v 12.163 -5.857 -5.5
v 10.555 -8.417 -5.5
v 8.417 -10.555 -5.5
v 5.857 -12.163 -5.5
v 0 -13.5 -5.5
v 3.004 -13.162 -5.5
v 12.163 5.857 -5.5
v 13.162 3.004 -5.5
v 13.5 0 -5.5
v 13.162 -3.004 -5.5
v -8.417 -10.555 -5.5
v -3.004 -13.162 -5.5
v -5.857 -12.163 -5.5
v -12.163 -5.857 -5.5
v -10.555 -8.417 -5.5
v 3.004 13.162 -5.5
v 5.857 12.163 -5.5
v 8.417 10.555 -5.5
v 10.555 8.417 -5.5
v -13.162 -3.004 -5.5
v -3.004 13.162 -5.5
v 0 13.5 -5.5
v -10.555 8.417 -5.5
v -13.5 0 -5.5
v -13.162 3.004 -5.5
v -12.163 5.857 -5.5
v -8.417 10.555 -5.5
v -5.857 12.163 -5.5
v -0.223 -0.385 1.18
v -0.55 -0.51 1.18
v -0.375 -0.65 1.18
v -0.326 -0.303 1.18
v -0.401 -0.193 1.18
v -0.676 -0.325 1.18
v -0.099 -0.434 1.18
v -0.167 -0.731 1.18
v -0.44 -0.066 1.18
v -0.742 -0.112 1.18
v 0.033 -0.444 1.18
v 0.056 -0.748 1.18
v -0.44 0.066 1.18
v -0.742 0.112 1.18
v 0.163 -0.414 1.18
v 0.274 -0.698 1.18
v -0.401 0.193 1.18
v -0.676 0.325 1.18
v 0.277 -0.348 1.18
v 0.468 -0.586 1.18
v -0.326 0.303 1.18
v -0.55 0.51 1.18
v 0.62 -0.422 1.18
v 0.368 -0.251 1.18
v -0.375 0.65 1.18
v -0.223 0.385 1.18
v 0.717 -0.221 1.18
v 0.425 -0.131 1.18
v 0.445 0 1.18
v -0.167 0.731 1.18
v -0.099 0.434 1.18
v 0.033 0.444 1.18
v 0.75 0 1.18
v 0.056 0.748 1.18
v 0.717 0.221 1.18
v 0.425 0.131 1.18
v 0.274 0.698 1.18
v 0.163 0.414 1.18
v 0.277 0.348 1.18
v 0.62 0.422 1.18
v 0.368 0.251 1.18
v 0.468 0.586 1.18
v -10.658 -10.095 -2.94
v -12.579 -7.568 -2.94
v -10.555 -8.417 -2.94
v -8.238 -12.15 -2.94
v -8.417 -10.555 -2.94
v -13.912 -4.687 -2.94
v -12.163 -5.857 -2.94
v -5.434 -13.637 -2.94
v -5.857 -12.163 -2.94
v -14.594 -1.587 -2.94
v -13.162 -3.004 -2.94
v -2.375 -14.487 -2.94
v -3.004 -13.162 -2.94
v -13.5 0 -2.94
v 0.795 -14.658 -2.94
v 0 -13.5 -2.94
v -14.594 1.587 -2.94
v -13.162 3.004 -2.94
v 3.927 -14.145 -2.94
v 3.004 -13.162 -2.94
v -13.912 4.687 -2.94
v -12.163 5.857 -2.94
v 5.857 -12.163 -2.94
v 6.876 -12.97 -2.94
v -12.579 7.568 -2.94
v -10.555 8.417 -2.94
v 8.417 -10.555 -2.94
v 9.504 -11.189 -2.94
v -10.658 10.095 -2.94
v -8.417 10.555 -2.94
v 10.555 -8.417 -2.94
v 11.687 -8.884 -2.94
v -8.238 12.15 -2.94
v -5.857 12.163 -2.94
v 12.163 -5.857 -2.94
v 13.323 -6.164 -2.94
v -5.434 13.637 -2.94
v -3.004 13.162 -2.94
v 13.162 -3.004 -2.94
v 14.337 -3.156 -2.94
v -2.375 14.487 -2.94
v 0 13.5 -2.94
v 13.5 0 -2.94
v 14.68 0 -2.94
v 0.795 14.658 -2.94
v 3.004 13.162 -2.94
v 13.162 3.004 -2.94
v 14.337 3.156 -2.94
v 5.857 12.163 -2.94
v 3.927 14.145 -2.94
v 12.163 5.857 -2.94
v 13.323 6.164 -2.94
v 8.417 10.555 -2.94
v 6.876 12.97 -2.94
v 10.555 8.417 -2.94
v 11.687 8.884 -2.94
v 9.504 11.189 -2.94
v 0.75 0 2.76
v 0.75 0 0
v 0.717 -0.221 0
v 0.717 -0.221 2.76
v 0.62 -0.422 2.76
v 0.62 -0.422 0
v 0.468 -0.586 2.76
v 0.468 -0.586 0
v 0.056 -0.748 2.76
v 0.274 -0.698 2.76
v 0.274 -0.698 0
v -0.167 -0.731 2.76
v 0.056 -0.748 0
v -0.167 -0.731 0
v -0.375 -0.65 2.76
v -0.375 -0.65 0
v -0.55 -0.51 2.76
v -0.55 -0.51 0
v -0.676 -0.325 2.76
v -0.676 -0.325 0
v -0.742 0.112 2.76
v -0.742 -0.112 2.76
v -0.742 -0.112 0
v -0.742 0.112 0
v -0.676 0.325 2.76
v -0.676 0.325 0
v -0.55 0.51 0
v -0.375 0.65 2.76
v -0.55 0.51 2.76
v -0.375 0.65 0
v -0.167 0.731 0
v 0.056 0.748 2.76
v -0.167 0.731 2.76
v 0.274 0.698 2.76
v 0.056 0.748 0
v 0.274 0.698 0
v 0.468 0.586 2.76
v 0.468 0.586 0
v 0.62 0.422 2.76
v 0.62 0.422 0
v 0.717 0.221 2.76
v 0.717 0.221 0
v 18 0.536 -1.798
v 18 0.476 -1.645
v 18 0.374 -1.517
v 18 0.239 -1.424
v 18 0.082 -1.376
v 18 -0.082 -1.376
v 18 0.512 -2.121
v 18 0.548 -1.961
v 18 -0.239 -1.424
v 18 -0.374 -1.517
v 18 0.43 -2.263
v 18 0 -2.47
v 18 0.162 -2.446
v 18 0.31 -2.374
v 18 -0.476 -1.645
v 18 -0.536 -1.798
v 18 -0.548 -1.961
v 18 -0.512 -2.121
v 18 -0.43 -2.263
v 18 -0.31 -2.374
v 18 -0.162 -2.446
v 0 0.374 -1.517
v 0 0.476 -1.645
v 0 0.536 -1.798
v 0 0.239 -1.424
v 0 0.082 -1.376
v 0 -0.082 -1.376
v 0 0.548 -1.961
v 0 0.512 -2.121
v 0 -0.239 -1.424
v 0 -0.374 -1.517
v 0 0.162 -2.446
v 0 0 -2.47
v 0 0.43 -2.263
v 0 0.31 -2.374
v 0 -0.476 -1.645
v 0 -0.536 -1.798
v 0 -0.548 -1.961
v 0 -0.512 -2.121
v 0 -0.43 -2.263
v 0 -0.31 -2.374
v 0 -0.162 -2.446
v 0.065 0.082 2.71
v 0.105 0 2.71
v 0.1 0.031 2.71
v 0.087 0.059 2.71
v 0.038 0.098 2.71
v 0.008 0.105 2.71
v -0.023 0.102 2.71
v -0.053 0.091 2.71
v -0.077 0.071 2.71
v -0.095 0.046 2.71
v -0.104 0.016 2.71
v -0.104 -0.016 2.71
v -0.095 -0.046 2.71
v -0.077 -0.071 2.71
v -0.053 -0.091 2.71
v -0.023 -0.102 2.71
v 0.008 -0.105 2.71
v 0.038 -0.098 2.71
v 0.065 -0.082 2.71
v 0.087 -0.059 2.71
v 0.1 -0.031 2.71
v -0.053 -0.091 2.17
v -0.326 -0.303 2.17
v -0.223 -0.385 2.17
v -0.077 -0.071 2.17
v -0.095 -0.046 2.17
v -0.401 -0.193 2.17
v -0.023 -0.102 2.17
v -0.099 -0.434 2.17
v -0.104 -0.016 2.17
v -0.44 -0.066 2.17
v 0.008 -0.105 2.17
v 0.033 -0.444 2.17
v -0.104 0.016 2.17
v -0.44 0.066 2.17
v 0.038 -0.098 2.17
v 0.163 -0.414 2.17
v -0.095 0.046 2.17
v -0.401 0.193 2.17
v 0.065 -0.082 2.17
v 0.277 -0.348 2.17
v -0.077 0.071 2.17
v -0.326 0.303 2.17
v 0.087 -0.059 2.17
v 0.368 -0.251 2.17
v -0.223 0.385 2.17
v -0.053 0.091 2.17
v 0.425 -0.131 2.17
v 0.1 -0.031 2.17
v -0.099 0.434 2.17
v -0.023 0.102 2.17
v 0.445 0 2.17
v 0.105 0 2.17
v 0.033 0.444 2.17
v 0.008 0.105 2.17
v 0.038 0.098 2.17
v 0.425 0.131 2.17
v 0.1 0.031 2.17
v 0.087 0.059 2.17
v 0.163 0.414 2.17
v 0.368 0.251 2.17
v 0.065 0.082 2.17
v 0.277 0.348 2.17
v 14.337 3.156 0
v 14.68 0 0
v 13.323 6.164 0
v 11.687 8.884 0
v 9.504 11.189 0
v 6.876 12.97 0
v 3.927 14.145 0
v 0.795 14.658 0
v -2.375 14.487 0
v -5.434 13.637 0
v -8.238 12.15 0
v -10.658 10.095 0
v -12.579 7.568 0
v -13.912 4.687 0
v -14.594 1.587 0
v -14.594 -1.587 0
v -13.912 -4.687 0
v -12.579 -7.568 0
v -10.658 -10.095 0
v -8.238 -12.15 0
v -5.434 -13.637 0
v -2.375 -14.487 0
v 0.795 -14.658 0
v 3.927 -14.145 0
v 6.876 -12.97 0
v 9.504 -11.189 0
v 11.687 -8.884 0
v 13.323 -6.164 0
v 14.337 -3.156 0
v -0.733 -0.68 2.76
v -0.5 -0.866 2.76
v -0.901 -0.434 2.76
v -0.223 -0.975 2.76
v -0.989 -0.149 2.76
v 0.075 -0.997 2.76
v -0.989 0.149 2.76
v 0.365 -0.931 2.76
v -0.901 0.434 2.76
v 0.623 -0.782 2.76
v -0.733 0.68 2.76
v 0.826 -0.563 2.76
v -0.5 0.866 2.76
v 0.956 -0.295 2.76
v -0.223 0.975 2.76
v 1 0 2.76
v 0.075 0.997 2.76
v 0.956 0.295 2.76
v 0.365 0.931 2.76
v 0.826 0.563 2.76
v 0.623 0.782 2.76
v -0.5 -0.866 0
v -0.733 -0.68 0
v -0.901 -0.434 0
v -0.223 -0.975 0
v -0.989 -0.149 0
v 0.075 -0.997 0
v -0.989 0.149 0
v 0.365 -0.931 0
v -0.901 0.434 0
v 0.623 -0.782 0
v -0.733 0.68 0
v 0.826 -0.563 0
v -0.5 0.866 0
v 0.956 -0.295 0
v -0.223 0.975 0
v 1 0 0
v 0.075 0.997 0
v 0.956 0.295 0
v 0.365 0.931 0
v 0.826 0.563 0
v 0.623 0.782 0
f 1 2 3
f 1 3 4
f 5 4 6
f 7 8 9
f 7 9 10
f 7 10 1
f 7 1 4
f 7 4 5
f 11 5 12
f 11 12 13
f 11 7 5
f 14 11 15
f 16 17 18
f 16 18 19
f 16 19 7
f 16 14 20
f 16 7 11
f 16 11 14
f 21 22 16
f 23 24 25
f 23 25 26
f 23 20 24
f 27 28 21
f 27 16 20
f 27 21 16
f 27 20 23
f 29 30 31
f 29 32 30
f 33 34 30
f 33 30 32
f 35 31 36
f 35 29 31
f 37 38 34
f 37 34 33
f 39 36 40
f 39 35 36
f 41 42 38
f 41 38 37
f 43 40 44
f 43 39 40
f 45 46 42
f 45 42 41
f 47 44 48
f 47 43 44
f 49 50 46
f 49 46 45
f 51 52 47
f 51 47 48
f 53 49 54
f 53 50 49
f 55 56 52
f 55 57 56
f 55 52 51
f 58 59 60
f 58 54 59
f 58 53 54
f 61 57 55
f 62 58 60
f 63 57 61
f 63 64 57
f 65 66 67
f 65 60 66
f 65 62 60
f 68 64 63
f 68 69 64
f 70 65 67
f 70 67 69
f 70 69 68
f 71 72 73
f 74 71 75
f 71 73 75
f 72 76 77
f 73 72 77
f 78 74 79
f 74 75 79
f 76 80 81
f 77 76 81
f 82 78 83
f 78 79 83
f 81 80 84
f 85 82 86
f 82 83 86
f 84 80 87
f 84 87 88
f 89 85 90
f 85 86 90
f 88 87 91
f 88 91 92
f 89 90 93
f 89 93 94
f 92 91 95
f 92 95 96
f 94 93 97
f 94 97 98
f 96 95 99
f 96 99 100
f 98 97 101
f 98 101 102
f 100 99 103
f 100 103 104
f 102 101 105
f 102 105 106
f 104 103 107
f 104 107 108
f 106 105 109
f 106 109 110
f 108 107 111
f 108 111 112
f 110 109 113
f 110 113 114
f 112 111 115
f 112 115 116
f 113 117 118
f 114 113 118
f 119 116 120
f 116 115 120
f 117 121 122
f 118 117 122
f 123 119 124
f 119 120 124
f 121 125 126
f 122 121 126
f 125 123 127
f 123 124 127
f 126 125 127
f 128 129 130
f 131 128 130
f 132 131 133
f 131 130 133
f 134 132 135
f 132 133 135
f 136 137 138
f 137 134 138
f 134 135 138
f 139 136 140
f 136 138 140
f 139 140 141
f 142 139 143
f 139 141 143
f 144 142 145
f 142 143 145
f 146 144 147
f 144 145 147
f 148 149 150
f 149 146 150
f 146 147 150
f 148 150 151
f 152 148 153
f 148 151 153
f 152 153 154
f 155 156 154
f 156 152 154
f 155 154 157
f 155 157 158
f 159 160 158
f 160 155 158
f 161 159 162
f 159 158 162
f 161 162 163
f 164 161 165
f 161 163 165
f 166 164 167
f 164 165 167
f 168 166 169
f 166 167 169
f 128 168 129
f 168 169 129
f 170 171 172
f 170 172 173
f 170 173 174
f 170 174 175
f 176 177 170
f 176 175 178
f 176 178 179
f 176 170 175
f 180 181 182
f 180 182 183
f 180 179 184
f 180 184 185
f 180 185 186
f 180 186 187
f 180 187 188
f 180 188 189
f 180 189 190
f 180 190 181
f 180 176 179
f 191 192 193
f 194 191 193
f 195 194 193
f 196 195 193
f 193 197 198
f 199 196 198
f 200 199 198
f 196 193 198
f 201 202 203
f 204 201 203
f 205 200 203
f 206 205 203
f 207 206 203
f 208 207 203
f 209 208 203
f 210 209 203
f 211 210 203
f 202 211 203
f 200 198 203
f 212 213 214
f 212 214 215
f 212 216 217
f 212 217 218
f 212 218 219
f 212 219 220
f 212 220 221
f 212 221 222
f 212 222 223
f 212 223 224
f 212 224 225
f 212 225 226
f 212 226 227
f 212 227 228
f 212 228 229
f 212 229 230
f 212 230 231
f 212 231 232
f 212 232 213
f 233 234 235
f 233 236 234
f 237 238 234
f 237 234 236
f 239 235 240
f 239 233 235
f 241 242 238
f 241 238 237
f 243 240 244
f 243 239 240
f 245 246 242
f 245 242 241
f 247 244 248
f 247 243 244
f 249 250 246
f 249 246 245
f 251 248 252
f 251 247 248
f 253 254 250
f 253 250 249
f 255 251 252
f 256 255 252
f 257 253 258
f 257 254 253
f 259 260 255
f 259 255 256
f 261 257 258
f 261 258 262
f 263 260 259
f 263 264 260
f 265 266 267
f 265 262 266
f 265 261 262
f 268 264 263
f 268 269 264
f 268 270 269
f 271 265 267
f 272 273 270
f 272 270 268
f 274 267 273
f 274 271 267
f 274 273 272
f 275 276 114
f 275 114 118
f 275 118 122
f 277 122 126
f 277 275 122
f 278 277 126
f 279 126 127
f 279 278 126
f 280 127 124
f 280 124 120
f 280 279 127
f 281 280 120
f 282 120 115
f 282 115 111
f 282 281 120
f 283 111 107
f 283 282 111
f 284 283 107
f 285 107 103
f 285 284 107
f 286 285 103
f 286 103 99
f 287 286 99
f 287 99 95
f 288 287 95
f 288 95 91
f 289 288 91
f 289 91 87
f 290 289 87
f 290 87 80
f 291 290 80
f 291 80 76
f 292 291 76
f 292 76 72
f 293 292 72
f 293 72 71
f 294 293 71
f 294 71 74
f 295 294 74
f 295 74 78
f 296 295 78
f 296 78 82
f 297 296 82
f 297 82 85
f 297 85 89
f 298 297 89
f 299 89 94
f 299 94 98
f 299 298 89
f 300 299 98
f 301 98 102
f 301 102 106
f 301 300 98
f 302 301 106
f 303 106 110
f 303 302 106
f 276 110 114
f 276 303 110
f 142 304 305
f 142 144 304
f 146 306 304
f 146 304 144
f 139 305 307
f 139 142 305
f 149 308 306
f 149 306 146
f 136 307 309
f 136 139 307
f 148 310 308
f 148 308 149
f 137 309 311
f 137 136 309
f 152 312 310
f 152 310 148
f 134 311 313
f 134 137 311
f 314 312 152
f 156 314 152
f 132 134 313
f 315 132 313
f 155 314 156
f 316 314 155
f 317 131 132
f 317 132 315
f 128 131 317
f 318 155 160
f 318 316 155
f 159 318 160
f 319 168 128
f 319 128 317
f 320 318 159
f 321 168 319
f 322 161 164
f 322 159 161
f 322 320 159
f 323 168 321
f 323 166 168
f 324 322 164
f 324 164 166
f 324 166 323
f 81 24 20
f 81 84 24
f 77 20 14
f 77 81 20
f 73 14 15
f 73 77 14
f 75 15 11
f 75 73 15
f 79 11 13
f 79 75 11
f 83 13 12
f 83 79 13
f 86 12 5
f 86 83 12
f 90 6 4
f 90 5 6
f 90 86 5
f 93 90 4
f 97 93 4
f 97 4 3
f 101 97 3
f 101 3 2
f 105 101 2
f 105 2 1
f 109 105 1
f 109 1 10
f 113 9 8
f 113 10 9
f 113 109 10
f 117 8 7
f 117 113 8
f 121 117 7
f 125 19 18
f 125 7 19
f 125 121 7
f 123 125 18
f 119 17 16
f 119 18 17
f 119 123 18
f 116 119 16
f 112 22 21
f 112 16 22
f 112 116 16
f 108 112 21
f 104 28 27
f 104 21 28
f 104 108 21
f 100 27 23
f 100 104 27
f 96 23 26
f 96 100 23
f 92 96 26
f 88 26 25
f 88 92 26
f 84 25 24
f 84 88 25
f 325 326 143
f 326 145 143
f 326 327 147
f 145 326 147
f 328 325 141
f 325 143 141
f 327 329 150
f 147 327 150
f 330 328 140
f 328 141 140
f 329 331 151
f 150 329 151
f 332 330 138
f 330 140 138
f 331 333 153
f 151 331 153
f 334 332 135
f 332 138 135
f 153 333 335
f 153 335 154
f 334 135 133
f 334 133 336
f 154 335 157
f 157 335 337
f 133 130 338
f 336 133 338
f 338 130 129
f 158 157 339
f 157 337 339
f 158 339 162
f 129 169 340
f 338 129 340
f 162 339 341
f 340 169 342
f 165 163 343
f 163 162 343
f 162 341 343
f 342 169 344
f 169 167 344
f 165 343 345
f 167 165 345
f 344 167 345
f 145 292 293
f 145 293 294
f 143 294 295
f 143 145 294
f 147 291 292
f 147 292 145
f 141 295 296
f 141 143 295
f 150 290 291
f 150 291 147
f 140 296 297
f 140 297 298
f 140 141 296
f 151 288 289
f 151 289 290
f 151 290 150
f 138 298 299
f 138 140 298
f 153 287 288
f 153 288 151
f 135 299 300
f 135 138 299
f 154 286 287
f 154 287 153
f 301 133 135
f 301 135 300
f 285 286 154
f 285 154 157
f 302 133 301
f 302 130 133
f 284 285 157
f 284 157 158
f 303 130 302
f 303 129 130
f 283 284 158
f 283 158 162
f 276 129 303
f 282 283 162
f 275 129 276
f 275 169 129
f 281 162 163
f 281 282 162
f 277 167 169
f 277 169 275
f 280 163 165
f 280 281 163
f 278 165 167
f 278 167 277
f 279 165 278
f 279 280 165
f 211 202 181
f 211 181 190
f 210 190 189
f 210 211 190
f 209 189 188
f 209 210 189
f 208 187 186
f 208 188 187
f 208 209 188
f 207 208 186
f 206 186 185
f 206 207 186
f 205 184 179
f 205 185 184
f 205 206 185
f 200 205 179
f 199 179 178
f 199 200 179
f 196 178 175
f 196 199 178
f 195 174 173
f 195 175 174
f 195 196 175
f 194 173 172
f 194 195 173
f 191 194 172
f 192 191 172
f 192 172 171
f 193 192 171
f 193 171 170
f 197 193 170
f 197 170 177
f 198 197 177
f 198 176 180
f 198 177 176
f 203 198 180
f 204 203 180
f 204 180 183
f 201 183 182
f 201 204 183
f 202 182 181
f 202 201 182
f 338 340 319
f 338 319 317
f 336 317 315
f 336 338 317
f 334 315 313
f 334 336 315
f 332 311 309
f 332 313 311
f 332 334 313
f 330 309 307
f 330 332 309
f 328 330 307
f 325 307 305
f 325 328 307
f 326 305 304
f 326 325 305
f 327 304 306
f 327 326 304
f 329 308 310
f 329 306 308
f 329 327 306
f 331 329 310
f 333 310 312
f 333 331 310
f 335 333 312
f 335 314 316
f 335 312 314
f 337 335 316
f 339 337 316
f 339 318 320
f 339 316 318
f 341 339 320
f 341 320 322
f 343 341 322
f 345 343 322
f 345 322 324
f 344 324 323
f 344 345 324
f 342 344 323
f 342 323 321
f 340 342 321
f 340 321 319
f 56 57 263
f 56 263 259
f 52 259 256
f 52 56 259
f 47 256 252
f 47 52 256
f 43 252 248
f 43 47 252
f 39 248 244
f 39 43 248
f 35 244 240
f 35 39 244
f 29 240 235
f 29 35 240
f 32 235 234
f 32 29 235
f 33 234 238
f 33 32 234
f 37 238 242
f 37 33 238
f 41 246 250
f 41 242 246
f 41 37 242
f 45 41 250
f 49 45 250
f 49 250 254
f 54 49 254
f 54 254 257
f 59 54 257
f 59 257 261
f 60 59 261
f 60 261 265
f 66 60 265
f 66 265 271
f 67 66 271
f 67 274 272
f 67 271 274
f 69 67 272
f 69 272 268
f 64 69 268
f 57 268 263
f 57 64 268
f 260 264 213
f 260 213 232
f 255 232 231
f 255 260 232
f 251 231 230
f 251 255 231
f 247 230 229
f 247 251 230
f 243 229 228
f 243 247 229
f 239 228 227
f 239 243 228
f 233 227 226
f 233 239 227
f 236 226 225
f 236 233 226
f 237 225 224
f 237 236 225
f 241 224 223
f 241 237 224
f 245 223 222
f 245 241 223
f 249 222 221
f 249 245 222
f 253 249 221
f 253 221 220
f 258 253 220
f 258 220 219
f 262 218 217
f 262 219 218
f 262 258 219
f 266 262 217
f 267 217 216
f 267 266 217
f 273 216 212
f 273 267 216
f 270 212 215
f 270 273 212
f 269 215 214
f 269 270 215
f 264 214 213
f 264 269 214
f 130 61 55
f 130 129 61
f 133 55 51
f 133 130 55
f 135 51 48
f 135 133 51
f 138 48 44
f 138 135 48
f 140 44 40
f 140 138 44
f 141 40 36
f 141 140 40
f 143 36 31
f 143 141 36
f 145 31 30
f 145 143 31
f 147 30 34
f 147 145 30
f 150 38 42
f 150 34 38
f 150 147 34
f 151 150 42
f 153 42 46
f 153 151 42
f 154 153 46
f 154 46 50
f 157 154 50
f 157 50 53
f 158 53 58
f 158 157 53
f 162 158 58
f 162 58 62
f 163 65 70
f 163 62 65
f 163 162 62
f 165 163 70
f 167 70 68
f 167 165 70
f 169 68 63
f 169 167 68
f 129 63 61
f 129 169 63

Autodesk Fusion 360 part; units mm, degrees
sketch "Sketch1" plane through (0, 0, 0) normal (0, 0, 1) x (1, 0, 0)
  circle A0 centre (0, 0) radius 14.68
  dimension "d1" = 29.36
extrude "Extrude1" add sketch "Sketch1" against normal blind 2.94 makes body 1
sketch "Sketch2" plane through (0, 0, -2.94) normal (0, 0, -1) x (-1, 0, 0)
  circle A0 centre (0, 0) radius 14.68
  circle A1 centre (0, 0) radius 13.5
  dimension "d4" = 27
extrude "Extrude2" add sketch "Sketch2" along normal blind 2.56 contours A1 bodies 1
sketch "Sketch3" plane through (0, 0, 0) normal (0, 0, 1) x (1, 0, 0)
  circle A0 centre (0, 0) radius 14.68
  circle A1 centre (0, 0) radius 0.75
  dimension "d7" = 1.5
extrude "Extrude3" add sketch "Sketch3" along normal blind 1.18 contours A1 bodies 1
sketch "Sketch4" plane through (0, 0, 1.18) normal (0, 0, 1) x (1, 0, 0)
  circle A0 centre (0, 0) radius 0.75
  circle A1 centre (0, 0) radius 0.445
  dimension "d10" = 0.89
extrude "Extrude4" add sketch "Sketch4" along normal blind 0.99 contours A1 bodies 1
sketch "Sketch5" plane through (0, 0, 2.17) normal (0, 0, 1) x (1, 0, 0)
  circle A0 centre (0, 0) radius 0.445
  circle A1 centre (0, 0) radius 0.105
  dimension "d13" = 0.21
extrude "Extrude5" add sketch "Sketch5" along normal blind 0.54 contours A1 bodies 1
sketch "Sketch6" plane through (0, 0, 0) normal (0, 0, 1) x (1, 0, 0)
  circle A0 centre (0, 0) radius 0.75
  circle A1 centre (0, 0) radius 14.68
  circle A2 centre (0, 0) radius 1
  dimension "d16" = 2
extrude "Extrude6" add sketch "Sketch6" along normal blind 2.76 separate body contours A2 makes body 2
sketch "Sketch7" plane through (0, 0, 0) normal (1, 0, 0) x (0, 0, -1)
  line L0 (0, 0) -> (1.92, 0) construction
  circle A0 centre (1.92, 0) radius 0.55
  dimension "d19" = 1.92
  dimension "d20" = 1.1
extrude "Extrude7" add sketch "Sketch7" along normal blind 18 separate body makes body 3
equation "d5 = 5.5 mm - 2.94 mm"
equation "d8 = 0.4 mm + 0.78 mm"
equation "d11 = 0.4 mm + 1.37 mm - 0.78 mm"
equation "d14 = 1.91 mm - 1.37 mm"
equation "d17 = 0.4 mm + 1.91 mm + 0.45 mm"
